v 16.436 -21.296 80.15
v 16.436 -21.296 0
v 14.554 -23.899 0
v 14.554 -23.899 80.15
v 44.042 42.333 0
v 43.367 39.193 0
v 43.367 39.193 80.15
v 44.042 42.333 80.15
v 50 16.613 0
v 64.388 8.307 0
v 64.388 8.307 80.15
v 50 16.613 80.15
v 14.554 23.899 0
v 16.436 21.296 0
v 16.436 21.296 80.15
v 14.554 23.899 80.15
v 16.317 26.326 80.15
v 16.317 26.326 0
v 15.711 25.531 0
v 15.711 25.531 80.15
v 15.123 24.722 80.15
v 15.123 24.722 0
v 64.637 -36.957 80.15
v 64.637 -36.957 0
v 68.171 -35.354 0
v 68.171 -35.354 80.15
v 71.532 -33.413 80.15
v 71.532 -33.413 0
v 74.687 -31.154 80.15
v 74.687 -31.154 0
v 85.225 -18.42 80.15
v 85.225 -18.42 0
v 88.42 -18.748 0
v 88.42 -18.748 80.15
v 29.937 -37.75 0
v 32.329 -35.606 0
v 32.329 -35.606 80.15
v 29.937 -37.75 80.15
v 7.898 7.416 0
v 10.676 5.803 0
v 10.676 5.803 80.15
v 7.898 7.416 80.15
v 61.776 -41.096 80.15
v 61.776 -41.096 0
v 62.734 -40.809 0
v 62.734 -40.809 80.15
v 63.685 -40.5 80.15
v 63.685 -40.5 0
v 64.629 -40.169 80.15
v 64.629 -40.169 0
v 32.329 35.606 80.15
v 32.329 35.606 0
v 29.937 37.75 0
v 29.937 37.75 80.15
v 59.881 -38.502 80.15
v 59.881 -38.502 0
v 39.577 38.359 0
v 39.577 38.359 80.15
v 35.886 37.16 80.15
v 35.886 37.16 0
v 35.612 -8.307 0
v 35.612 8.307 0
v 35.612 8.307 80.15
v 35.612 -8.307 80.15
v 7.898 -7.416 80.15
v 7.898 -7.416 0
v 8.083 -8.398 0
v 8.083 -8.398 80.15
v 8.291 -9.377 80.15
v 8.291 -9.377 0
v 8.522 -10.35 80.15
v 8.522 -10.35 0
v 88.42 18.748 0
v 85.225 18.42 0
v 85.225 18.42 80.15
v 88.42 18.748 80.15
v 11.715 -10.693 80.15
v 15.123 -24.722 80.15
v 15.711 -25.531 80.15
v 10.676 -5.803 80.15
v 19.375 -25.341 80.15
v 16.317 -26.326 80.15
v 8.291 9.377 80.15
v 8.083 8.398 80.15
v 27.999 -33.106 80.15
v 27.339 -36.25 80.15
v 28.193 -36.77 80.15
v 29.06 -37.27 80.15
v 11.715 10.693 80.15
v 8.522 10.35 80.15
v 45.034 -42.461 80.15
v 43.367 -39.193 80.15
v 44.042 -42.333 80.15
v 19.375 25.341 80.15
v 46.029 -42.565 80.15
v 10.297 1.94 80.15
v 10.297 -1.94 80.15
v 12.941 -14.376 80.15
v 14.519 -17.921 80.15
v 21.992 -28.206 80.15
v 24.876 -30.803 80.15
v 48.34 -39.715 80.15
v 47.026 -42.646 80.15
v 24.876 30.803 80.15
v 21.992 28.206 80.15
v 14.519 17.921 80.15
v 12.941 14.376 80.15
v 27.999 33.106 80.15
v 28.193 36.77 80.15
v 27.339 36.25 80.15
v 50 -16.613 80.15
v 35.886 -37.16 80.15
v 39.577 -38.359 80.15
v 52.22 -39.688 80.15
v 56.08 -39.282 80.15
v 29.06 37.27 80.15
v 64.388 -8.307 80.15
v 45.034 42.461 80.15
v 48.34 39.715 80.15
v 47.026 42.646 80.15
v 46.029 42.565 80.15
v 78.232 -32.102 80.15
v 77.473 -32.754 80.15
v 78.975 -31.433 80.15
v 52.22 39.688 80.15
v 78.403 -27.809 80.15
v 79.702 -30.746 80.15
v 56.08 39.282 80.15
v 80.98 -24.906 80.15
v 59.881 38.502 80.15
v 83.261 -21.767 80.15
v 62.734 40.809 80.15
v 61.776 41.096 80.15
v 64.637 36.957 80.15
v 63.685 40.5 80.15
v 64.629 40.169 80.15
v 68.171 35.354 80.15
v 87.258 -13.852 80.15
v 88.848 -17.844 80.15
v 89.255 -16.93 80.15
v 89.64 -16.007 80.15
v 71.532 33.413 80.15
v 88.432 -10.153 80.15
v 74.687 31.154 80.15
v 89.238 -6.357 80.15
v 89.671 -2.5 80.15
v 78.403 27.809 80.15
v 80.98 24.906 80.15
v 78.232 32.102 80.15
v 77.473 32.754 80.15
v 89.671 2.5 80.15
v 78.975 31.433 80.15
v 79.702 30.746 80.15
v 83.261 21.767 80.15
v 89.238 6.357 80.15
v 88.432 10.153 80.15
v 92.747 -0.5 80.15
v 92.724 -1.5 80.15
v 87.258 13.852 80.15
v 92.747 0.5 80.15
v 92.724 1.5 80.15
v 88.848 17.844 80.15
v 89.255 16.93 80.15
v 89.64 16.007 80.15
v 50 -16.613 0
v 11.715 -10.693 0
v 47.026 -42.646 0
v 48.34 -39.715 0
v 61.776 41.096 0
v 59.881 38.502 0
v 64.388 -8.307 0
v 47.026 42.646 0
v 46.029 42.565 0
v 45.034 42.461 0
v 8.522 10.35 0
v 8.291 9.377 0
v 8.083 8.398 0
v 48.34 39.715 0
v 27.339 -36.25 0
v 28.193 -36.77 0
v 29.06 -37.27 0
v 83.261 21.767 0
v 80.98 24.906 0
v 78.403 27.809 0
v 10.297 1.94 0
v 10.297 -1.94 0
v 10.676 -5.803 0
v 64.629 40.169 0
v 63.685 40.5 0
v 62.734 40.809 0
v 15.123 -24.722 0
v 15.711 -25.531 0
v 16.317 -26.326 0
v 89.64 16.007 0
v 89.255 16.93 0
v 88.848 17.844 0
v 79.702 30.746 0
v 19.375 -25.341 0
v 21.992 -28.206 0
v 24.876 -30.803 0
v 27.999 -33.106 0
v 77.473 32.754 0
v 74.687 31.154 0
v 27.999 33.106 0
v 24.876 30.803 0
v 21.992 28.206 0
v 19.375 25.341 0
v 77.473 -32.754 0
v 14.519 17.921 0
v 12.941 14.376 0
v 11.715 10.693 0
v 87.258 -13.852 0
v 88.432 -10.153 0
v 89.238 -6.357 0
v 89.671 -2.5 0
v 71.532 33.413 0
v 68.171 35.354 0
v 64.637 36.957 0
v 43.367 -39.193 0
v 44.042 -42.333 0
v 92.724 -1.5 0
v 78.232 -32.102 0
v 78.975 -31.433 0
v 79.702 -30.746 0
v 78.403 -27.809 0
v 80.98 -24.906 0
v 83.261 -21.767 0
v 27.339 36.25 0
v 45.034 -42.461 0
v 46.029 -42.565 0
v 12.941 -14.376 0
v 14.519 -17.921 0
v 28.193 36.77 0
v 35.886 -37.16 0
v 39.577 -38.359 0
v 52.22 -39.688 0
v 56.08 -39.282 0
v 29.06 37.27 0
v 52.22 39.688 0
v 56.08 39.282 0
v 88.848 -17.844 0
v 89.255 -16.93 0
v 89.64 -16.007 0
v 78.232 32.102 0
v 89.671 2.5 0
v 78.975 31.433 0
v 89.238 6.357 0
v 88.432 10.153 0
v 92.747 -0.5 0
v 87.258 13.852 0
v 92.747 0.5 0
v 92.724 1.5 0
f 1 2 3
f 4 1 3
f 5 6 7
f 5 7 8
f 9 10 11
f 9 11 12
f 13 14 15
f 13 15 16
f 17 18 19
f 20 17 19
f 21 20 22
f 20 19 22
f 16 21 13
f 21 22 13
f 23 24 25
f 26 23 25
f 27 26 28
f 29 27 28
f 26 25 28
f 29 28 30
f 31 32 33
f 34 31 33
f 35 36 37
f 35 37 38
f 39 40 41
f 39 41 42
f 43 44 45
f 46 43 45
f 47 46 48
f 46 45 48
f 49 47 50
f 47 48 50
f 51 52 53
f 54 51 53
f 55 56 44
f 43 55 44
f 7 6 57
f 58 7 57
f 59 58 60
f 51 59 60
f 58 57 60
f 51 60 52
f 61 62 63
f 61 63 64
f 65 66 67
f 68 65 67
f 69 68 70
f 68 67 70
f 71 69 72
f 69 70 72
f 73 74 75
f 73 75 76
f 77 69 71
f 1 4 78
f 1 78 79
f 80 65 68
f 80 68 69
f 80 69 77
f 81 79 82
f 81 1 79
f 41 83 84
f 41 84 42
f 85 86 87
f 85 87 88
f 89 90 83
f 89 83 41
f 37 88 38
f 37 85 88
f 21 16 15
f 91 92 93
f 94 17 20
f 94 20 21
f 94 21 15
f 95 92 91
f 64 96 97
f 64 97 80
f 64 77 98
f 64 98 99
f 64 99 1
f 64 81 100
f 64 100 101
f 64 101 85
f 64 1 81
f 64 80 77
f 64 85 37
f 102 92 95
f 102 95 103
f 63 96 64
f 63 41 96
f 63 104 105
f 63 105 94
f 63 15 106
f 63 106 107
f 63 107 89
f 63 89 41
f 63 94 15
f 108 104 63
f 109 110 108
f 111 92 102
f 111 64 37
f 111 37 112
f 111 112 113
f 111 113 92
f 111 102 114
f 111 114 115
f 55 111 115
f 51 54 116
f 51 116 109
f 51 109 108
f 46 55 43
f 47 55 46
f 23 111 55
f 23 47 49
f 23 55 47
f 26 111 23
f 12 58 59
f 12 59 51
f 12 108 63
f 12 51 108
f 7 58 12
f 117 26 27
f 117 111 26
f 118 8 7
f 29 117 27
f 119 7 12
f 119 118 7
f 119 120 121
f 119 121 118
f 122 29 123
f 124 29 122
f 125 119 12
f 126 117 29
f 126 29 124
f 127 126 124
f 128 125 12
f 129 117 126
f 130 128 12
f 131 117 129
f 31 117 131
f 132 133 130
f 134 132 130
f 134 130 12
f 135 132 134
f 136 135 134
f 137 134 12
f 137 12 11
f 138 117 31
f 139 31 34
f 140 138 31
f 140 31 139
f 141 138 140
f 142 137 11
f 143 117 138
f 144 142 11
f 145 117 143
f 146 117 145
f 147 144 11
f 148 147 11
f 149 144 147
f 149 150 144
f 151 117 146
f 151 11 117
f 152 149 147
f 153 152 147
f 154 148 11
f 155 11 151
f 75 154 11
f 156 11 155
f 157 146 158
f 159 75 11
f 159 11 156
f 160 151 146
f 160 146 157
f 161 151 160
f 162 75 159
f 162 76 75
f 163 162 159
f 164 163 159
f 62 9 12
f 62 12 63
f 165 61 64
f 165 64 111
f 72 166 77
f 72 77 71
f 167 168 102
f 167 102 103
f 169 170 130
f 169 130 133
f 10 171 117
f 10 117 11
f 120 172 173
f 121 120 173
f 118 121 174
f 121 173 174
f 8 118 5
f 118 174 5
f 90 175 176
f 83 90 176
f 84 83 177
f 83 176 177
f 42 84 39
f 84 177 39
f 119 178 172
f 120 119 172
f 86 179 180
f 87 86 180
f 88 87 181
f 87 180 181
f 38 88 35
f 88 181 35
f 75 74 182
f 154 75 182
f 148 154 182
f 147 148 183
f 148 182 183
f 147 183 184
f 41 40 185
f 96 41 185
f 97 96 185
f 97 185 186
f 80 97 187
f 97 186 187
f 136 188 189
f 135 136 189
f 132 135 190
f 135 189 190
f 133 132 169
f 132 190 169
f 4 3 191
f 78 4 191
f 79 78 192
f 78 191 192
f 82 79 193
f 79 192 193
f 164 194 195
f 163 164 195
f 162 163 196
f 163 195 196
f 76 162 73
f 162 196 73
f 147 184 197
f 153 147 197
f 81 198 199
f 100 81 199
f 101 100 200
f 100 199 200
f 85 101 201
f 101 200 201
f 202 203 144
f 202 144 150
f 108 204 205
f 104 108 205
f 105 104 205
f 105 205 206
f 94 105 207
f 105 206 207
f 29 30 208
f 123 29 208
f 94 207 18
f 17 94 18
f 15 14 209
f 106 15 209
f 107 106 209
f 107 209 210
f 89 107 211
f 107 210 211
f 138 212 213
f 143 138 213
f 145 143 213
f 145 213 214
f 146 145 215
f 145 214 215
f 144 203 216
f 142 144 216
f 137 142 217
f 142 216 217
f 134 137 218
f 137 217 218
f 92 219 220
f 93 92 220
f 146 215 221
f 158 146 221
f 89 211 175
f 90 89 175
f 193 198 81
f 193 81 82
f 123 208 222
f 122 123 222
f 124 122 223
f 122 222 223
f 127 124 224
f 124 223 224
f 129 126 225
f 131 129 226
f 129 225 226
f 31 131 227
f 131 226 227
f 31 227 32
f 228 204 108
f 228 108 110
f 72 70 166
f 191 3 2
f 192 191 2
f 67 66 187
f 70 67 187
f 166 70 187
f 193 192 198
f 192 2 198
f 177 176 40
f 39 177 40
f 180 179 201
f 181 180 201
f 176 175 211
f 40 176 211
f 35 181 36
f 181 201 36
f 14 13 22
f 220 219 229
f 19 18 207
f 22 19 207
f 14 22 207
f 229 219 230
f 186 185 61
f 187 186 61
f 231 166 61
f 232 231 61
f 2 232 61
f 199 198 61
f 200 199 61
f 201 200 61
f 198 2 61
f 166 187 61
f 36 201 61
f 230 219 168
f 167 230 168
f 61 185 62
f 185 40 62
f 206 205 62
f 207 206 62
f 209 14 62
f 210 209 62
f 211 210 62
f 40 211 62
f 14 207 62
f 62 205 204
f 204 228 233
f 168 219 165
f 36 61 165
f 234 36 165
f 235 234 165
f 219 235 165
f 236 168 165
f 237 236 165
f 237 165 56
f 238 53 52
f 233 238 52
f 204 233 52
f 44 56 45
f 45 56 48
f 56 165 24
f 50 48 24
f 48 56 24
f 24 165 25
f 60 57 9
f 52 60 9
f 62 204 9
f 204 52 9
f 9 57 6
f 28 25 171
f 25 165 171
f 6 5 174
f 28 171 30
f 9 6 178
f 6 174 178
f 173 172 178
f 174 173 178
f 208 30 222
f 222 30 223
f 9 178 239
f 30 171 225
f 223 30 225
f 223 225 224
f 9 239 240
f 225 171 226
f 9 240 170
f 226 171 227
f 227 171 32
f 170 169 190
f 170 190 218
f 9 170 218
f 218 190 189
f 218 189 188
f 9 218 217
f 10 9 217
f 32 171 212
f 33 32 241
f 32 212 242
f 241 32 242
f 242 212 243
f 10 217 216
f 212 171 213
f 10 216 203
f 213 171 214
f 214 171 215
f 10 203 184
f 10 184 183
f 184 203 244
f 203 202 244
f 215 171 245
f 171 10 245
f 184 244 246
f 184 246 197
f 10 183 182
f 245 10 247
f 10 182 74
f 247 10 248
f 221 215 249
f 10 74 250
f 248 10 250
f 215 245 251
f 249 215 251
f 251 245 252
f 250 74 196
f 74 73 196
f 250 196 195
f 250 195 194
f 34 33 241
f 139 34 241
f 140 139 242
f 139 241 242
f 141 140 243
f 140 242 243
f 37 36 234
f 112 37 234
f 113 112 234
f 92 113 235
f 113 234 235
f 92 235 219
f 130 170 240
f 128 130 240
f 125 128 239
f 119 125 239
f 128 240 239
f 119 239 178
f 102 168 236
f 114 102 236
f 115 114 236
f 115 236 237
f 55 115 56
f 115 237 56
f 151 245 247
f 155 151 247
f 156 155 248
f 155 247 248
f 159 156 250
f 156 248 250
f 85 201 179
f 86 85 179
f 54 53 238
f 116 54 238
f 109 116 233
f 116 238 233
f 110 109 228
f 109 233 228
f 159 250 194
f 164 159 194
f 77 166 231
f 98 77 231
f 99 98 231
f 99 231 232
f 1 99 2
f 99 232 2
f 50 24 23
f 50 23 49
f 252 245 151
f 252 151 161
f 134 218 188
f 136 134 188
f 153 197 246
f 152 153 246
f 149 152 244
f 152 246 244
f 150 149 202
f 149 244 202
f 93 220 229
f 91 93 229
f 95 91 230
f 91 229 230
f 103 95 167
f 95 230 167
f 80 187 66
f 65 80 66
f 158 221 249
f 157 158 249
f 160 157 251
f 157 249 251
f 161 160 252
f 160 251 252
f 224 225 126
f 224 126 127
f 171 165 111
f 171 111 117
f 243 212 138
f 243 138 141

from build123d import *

# Parameters (mm, degrees)
SKETCH008_R           = 39.75
PAD007_DEPTH          = 80.15
PAD008_DEPTH          = 80.15
POLARPATTERN005_COUNT = 15
POCKET008_DEPTH       = 80.151


with BuildPart() as part:
    # Sketch008 → Pad007 (new body)
    with BuildSketch(Plane.XY):
        Circle(SKETCH008_R)
    extrude(amount=PAD007_DEPTH)

    # Sketch006 → Pad008 (join)
    with BuildSketch(Plane.XY):
        with BuildLine():
            ThreePointArc((42.723676, -1.5), (42.75, 0), (42.723676, 1.5))
            Line((39.671306, 2.5), (42.723676, 1.5))
            Line((39.671306, 2.5), (26.5, 0))
            Line((26.5, 0), (39.671306, -2.5))
            Line((39.671306, -2.5), (42.723676, -1.5))
        make_face()
    pad008 = extrude(amount=PAD008_DEPTH)

    # PolarPattern005: Pad008 ×15 about axis
    polarpattern005_axis = Axis((0, 0, 0), (0, 0, 1))
    for i in range(1, POLARPATTERN005_COUNT):
        add(pad008.rotate(polarpattern005_axis, i * 360 / POLARPATTERN005_COUNT))

    # Sketch007 → Pocket008 (cut, through all)
    with BuildSketch(Plane.XY):
        Polygon((14.3875, 8.306627), (0, 16.613254), (-14.3875, 8.306627), (-14.3875, -8.306627), (0, -16.613254), (14.3875, -8.306627), align=None)
    extrude(amount=POCKET008_DEPTH, mode=Mode.SUBTRACT)


with BuildPart() as part_1:
    # Body011 placement: moved
    add(part.part.moved(Location((50, 0, 0))))


solid = part_1.part
